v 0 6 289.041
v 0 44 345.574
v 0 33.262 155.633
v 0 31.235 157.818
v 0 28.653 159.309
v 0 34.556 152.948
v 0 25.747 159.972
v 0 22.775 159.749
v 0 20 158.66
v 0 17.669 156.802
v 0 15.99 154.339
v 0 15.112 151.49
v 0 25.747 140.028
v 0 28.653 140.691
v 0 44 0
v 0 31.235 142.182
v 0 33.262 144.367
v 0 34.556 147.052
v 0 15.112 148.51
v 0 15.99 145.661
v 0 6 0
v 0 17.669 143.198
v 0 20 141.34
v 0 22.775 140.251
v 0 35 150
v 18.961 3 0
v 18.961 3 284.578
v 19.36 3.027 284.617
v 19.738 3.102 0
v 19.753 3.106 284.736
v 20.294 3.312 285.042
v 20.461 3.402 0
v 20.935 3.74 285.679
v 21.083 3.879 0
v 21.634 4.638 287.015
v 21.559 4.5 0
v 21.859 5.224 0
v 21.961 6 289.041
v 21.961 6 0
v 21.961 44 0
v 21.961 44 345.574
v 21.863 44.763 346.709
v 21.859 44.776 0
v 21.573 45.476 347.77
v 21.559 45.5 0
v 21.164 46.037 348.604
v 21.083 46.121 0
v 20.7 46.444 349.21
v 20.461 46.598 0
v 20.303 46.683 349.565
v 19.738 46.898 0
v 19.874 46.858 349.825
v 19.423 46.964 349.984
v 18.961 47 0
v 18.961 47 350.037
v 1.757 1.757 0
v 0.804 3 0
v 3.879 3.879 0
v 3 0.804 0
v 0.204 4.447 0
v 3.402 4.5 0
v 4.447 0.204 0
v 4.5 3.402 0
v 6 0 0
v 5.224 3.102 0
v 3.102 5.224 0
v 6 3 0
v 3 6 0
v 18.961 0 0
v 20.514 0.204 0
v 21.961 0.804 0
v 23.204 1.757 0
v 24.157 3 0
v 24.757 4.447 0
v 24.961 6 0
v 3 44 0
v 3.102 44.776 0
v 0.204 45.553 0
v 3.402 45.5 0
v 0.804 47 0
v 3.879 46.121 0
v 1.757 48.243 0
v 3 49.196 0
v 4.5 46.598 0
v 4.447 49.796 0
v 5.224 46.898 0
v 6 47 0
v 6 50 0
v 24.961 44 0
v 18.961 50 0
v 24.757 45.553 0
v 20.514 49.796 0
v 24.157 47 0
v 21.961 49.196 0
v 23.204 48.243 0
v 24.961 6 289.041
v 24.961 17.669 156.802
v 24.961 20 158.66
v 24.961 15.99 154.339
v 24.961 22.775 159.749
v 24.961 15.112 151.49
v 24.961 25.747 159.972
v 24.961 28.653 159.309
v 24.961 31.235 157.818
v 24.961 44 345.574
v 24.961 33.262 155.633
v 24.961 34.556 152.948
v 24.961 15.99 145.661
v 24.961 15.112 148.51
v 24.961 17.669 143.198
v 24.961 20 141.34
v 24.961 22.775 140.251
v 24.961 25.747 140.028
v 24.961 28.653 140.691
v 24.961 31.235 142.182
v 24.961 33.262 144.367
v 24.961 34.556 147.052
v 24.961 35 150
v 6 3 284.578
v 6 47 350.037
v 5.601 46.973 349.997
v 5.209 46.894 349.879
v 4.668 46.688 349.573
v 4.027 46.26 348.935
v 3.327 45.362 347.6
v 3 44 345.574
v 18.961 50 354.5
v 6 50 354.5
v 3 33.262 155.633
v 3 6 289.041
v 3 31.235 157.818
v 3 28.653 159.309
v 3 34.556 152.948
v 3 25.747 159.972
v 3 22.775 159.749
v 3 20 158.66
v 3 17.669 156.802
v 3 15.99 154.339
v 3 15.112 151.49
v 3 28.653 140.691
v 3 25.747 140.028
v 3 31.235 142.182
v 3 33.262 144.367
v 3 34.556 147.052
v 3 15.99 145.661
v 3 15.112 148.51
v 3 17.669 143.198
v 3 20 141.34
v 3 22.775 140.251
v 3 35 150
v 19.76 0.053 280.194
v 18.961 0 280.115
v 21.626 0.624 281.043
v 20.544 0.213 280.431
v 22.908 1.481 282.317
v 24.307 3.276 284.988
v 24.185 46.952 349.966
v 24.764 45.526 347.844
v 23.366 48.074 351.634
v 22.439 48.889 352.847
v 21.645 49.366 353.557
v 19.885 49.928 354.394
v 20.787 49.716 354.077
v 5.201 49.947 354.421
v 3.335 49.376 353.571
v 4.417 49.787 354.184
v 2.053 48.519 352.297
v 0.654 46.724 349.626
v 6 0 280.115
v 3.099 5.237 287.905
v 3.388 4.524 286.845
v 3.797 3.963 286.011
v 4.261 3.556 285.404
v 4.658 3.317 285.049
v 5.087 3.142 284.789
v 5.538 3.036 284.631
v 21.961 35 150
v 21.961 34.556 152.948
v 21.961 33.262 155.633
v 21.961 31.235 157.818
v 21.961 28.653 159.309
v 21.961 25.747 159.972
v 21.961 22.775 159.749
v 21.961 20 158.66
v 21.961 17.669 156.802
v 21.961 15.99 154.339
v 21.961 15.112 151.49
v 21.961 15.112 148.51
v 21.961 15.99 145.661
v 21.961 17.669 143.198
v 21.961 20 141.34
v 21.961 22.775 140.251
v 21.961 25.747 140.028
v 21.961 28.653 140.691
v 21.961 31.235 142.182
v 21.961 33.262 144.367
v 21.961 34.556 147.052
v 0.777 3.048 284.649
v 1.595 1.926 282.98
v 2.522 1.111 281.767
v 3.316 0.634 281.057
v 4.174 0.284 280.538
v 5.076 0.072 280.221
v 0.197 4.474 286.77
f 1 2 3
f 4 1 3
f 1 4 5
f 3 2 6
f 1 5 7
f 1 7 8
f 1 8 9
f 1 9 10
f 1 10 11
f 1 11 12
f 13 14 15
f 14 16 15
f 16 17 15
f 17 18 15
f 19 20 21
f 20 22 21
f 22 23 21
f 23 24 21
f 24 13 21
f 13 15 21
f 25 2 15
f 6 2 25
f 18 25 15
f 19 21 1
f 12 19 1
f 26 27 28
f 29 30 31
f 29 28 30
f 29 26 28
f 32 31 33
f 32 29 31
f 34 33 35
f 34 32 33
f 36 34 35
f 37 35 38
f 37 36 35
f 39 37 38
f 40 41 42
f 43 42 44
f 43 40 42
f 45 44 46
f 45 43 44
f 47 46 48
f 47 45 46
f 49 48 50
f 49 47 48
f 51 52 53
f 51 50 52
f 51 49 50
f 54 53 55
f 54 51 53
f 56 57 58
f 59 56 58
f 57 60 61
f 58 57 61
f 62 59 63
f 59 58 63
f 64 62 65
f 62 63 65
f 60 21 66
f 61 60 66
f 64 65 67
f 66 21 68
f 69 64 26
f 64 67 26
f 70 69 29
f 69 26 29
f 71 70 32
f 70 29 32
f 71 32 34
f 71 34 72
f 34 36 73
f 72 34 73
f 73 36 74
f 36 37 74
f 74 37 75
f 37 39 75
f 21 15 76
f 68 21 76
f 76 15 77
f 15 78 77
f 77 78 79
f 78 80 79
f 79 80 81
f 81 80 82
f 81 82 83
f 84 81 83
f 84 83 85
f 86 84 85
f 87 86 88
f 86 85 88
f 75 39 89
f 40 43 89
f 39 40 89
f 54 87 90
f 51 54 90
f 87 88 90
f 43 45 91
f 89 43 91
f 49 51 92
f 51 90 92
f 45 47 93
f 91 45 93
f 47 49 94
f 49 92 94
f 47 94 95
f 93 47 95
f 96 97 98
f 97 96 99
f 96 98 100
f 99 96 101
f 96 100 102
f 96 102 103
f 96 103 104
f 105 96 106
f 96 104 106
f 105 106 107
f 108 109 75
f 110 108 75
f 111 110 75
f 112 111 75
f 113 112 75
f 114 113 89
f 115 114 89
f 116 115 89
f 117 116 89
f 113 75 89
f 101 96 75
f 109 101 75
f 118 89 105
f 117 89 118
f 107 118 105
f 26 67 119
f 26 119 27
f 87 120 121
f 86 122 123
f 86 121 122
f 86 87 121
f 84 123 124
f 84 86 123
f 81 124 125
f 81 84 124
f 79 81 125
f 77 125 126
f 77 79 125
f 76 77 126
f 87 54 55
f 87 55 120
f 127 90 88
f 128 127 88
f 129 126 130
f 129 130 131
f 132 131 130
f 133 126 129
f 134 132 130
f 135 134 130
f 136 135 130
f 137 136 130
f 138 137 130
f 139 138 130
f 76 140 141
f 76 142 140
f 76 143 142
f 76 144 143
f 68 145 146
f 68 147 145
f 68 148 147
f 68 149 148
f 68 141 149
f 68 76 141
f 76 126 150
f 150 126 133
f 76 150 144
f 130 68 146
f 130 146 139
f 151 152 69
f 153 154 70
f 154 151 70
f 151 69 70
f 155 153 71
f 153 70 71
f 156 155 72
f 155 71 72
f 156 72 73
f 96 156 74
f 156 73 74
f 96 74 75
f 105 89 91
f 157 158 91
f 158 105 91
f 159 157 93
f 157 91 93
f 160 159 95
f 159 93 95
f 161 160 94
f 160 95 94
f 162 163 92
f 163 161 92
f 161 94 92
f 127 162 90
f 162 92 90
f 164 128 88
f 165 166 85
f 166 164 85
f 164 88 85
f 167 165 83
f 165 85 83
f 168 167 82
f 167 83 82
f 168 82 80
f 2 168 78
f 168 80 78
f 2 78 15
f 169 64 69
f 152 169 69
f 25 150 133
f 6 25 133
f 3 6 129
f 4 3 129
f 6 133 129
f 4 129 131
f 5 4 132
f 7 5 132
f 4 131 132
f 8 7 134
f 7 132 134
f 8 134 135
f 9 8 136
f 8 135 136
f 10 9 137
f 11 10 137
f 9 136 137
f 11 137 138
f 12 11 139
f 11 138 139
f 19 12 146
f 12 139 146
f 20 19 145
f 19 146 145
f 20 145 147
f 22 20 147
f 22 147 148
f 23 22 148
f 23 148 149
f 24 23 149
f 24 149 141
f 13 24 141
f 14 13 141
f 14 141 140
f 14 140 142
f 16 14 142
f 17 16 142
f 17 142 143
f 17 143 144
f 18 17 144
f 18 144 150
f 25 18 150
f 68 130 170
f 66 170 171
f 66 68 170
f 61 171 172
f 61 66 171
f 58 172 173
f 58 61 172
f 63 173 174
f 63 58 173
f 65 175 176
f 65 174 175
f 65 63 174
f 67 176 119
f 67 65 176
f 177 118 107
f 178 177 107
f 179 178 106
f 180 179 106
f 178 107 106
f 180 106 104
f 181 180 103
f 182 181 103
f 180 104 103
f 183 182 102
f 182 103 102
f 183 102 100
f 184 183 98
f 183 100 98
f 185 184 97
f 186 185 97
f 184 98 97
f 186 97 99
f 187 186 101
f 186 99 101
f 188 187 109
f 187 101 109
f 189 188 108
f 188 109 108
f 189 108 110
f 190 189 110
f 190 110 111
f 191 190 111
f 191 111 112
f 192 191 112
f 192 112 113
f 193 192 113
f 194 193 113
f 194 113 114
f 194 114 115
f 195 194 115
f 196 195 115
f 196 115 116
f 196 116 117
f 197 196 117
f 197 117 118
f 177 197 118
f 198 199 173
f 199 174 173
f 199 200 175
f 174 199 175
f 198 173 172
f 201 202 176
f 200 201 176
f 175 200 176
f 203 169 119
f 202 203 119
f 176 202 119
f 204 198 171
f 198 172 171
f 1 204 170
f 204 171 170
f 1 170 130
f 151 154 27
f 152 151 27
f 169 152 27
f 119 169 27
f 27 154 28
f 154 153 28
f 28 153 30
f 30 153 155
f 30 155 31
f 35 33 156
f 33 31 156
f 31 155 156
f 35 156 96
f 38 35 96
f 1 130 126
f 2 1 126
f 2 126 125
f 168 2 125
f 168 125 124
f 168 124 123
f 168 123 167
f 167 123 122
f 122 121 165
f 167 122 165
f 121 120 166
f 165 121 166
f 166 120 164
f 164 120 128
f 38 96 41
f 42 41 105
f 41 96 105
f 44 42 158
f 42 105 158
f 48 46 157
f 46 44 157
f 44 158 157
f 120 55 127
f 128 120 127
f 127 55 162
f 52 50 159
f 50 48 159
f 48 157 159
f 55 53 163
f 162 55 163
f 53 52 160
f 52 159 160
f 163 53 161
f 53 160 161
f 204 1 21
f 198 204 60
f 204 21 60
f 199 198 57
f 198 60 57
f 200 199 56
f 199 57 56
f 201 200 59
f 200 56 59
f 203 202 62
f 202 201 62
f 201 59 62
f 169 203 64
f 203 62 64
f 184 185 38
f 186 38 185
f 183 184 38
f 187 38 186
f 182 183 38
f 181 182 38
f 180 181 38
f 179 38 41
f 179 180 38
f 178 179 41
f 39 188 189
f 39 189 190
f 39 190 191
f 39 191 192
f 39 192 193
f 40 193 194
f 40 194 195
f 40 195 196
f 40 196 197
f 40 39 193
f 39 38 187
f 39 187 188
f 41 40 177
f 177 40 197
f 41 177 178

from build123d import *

# Parameters (mm, degrees)
BOSS_EXTRUDE1_DEPTH = 356.5
CUT_EXTRUDE1_DEPTH  = 361.853587106
SKETCH3_R           = 10
CUT_EXTRUDE2_DEPTH  = 359.877850149


with BuildPart() as part:
    # Sketch1 → Boss-Extrude1 (new body)
    with BuildSketch(Plane.XY):
        with BuildLine():
            Line((0, 44), (0, 6))
            ThreePointArc((0, 6), (1.757359313, 1.757359313), (6, 0))
            Line((6, 0), (18.96119643, 0))
            ThreePointArc((18.96119643, 0), (23.203837117, 1.757359313), (24.96119643, 6))
            Line((24.96119643, 6), (24.96119643, 44))
            ThreePointArc((24.96119643, 44), (23.203837117, 48.242640687), (18.96119643, 50))
            Line((18.96119643, 50), (6, 50))
            ThreePointArc((6, 50), (1.757359313, 48.242640687), (0, 44))
        make_face()
        with BuildLine():
            Line((3, 44), (3, 6))
            ThreePointArc((3, 6), (3.878679656, 3.878679656), (6, 3))
            Line((6, 3), (18.96119643, 3))
            ThreePointArc((18.96119643, 3), (21.082516774, 3.878679656), (21.96119643, 6))
            Line((21.96119643, 6), (21.96119643, 44))
            ThreePointArc((21.96119643, 44), (21.082516774, 46.121320344), (18.96119643, 47))
            Line((18.96119643, 47), (6, 47))
            ThreePointArc((6, 47), (3.878679656, 46.121320344), (3, 44))
        make_face(mode=Mode.SUBTRACT)
    extrude(amount=BOSS_EXTRUDE1_DEPTH)

    # Sketch2 → Cut-Extrude1 (cut, through all)
    with BuildSketch(Plane(origin=(24.96119643, 0, 0), x_dir=(0, 0, -1), z_dir=(1, 0, 0))):
        Polygon((-354.5, 50), (-356.5, 50), (-356.5, 0), (-291.6, 0), (-280.114542558, 0), align=None)
    extrude(amount=-CUT_EXTRUDE1_DEPTH, mode=Mode.SUBTRACT)

    # Sketch3 → Cut-Extrude2 (cut, through all)
    with BuildSketch(Plane(origin=(24.96119643, 0, 0), x_dir=(0, 0, -1), z_dir=(1, 0, 0))):
        with Locations(Location((-150, 25, 0), (0, 0, 90))):
            Circle(SKETCH3_R)
    extrude(amount=-CUT_EXTRUDE2_DEPTH, mode=Mode.SUBTRACT)


solid = part.part
